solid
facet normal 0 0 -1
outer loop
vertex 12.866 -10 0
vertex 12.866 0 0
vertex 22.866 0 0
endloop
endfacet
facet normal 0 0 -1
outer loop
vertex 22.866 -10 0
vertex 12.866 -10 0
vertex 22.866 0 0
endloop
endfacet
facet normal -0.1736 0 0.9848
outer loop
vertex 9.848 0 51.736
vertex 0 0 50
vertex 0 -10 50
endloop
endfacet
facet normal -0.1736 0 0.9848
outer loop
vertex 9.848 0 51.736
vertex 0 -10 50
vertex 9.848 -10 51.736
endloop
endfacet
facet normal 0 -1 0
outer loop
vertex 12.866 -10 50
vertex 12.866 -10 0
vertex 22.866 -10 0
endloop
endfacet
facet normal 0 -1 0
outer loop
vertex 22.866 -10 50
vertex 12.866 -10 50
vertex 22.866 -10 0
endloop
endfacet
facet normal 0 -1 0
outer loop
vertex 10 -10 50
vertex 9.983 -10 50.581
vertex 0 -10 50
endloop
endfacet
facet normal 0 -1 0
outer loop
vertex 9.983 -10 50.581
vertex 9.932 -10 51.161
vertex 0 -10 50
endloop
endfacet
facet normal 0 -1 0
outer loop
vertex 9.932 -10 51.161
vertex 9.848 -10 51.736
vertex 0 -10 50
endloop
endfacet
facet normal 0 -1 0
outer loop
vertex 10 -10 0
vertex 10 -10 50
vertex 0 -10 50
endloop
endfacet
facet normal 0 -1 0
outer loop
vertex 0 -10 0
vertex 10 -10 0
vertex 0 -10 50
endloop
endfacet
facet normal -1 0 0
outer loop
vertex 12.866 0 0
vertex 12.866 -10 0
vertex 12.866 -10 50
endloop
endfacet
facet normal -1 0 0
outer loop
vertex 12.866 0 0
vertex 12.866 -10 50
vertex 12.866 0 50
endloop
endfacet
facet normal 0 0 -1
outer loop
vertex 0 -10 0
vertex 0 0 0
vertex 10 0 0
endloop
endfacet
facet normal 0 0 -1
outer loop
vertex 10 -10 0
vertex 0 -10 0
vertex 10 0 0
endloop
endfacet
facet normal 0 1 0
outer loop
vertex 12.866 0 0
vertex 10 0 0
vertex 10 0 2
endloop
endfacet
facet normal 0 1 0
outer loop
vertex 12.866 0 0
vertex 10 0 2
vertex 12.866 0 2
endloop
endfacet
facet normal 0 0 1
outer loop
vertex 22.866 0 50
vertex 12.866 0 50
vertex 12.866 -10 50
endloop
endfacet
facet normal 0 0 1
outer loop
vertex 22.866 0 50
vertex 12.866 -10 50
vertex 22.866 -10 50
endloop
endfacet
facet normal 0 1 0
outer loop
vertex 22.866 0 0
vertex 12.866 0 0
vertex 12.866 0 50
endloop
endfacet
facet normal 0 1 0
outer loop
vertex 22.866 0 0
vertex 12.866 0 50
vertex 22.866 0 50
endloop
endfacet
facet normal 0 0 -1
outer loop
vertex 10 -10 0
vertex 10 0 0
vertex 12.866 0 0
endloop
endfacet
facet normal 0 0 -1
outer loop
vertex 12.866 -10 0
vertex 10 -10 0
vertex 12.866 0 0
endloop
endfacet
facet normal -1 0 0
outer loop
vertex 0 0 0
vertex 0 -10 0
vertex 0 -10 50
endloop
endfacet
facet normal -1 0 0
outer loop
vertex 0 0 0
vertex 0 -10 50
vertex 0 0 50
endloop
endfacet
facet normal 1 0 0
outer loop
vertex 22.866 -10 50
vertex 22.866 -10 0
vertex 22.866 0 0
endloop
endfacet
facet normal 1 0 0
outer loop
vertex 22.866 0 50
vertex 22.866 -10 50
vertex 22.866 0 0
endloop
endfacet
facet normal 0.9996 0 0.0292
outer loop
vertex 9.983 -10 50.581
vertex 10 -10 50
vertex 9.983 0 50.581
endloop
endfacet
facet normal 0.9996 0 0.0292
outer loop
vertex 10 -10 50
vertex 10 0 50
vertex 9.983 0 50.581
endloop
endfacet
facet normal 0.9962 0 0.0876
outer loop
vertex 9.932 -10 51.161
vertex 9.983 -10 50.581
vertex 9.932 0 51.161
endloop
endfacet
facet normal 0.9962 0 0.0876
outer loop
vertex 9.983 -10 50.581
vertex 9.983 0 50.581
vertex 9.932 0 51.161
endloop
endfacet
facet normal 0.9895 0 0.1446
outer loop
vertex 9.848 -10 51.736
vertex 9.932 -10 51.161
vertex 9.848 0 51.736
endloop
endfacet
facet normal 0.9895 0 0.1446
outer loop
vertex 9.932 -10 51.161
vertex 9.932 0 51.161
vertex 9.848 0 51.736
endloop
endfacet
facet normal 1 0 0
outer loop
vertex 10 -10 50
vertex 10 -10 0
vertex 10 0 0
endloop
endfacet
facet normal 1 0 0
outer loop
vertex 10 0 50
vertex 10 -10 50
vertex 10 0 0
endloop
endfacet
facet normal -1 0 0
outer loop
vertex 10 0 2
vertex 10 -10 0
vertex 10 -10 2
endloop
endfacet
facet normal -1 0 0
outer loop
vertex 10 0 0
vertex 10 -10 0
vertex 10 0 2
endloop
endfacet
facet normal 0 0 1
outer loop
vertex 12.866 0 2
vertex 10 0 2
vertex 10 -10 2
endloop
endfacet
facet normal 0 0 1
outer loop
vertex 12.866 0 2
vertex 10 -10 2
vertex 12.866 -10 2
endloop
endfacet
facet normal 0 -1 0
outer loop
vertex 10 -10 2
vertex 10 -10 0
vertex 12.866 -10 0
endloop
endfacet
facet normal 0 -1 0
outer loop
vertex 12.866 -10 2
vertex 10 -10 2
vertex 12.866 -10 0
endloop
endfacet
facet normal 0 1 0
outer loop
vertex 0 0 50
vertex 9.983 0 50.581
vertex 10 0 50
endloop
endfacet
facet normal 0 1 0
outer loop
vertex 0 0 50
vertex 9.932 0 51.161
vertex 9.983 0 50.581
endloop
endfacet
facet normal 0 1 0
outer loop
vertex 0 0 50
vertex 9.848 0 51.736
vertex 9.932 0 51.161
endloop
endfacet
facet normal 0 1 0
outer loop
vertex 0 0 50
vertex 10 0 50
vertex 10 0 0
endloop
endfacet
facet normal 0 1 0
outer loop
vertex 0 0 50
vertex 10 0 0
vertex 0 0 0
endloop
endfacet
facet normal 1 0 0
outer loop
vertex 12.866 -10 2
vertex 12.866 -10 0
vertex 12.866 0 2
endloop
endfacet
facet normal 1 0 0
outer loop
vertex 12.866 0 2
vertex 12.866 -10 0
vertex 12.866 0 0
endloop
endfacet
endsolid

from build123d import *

# Parameters (mm, degrees)
F0_W      = 10
F0_H      = 10
F1_DEPTH  = 50
F0_W_2    = 2.86611
F2_DEPTH  = 2
F1_FACE_W = 10
F1_FACE_H = 10
F3_ANGLE  = 10


with BuildPart() as f1:
    # F0 (on Top) → F1 (new body)
    with BuildSketch(Plane.XY):
        with Locations((17.86611, -5)):
            Rectangle(F0_W, F0_H)
        with Locations((5, -5)):
            Rectangle(F0_W, F0_H)
    extrude(amount=F1_DEPTH)

    # F1_face (on face) → F3 (revolve)
    with BuildSketch(Plane(origin=(5, -5, 50), x_dir=(1, 0, 0), z_dir=(0, 0, 1))):
        Rectangle(F1_FACE_W, F1_FACE_H)
    revolve(axis=Axis((0, -5, 50), (0, -1, 0)), revolution_arc=F3_ANGLE)


with BuildPart() as f2:
    # F0 (on Top) → F2 (new body)
    with BuildSketch(Plane.XY):
        with Locations((11.433055, -5)):
            Rectangle(F0_W_2, F0_H)
    extrude(amount=F2_DEPTH)


solid = Compound([f1.part, f2.part])
